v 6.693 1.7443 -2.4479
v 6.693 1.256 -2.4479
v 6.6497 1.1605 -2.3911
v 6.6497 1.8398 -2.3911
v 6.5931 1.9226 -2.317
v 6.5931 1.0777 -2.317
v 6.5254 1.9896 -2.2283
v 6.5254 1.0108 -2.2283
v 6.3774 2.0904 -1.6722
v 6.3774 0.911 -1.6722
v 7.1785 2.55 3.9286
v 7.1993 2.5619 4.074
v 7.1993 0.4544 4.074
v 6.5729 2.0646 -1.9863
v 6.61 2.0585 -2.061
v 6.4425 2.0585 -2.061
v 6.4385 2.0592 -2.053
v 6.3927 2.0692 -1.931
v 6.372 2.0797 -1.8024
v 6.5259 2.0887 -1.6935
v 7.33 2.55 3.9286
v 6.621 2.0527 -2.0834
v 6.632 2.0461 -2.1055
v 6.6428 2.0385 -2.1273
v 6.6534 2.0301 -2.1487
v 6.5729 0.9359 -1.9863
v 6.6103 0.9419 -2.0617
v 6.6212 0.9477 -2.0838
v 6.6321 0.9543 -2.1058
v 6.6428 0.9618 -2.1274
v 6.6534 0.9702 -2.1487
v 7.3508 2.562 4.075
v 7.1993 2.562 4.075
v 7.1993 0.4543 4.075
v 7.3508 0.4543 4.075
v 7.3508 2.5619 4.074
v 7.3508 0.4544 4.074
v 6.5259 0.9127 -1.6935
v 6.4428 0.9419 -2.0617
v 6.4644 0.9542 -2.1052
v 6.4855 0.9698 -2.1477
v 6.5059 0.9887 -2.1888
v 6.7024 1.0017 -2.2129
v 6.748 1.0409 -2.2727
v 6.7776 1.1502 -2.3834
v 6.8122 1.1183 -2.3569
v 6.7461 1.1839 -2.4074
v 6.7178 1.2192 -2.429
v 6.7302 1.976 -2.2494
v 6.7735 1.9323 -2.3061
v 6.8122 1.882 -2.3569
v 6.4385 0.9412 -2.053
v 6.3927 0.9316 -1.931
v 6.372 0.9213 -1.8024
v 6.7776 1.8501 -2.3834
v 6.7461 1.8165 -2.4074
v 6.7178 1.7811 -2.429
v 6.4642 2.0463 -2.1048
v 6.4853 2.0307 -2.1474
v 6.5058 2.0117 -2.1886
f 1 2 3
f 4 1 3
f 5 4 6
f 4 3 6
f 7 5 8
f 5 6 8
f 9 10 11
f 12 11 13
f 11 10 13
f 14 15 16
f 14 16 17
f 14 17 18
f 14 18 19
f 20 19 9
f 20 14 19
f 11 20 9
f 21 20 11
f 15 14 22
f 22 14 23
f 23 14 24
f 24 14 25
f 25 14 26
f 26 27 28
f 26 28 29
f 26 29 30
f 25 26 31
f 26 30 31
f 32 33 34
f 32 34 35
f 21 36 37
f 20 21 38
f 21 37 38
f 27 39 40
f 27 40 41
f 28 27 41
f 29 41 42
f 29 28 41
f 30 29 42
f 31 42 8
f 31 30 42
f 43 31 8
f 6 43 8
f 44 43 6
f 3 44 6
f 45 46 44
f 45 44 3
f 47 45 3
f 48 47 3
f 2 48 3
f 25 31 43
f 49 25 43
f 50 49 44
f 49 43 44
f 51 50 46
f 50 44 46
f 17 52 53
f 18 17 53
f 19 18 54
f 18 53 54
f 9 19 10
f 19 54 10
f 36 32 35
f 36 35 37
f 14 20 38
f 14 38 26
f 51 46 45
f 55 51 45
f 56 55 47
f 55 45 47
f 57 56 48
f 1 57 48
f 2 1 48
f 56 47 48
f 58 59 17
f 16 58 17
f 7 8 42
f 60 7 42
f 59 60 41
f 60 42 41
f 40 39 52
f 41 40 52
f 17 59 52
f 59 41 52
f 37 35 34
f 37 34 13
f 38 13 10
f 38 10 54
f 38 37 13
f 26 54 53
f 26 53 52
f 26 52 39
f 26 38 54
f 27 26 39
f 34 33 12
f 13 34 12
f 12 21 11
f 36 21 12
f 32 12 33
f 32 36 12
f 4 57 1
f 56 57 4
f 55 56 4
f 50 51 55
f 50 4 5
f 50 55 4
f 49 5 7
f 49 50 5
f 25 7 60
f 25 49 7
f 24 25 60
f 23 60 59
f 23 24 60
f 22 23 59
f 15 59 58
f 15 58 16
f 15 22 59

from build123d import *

# Parameters (mm, degrees)
BOSS_EXTRUDE1_DEPTH = 3
SKETCH5_W           = 0.151526287
SKETCH5_H           = 0.001
BOSS_EXTRUDE2_DEPTH = 3
CUT_EXTRUDE1_DEPTH  = 10


with BuildPart() as part:
    # Sketch2 → Boss-Extrude1 (new body)
    with BuildSketch(Plane(origin=(0, 0, 0), x_dir=(1, 0, 0), z_dir=(0, 1, 0))):
        with BuildLine():
            Line((7.350781328, -4.074037176), (6.525926163, 1.693470822))
            Line((6.525926163, 1.693470822), (6.572920215, 1.986347748))
            Line((6.572920215, 1.986347748), (6.653421311, 2.148724708))
            Line((6.653421311, 2.148724708), (6.812248323, 2.356937113))
            Line((6.812248323, 2.356937113), (6.692985769, 2.447912072))
            Line((6.692985769, 2.447912072), (6.525425984, 2.228251541))
            Line((6.525425984, 2.228251541), (6.438529344, 2.052974273))
            ThreePointArc((6.438529344, 2.052974273), (6.379099159, 1.867238909), (6.377437076, 1.672234269))
            Line((6.377437076, 1.672234269), (7.199255041, -4.074037176))
            Line((7.199255041, -4.074037176), (7.200781328, -4.074037176))
            Line((7.200781328, -4.074037176), (7.350781328, -4.074037176))
        make_face()
    extrude(amount=BOSS_EXTRUDE1_DEPTH)

    # Sketch5 → Boss-Extrude2 (add)
    with BuildSketch(Plane(origin=(0, 3, 0), x_dir=(1, 0, 0), z_dir=(0, 1, 0))):
        with Locations((7.275018185, -4.074537176)):
            Rectangle(SKETCH5_W, SKETCH5_H)
    extrude(amount=-BOSS_EXTRUDE2_DEPTH)

    # Sketch6 → Cut-Extrude1 (cut)
    with BuildSketch(Plane(origin=(7.350781328, 0, 0), x_dir=(0, 0, -1), z_dir=(1, 0, 0))):
        with BuildLine():
            Line((-4.338213524, 2.884617609), (-4.338213524, 3.4381611))
            Line((-4.338213524, 3.4381611), (3.164112777, 3.4381611))
            Line((3.164112777, 3.4381611), (3.164112777, -0.438544946))
            Line((3.164112777, -0.438544946), (-4.348844922, -0.438544946))
            Line((-4.348844922, -0.438544946), (-4.337569204, 0.13248559))
            ThreePointArc((-4.337569204, 0.13248559), (-4.436691825, 0.166168098), (-4.478844922, 0.26199566))
            Line((-4.478844922, 0.26199566), (-4.478844922, 0.302134153))
            ThreePointArc((-4.478844922, 0.302134153), (-4.44607086, 0.391599096), (-4.359634831, 0.431685602))
            Line((-4.359634831, 0.431685602), (2.061660338, 0.9419327))
            ThreePointArc((2.061660338, 0.9419327), (2.502438753, 1.500467574), (2.061048418, 2.058518994))
            Line((2.061048418, 2.058518994), (-3.928609238, 2.549999344))
            Line((-3.928609238, 2.549999344), (-4.178844922, 2.570532391))
            Line((-4.178844922, 2.570532391), (-4.35947632, 2.585354069))
            ThreePointArc((-4.35947632, 2.585354069), (-4.444453713, 2.626833668), (-4.478844922, 2.714918622))
            Line((-4.478844922, 2.714918622), (-4.478844922, 2.755053056))
            ThreePointArc((-4.478844922, 2.755053056), (-4.436929876, 2.850661847), (-4.338213524, 2.884617609))
        make_face()
    extrude(amount=-CUT_EXTRUDE1_DEPTH, mode=Mode.SUBTRACT)


solid = part.part
